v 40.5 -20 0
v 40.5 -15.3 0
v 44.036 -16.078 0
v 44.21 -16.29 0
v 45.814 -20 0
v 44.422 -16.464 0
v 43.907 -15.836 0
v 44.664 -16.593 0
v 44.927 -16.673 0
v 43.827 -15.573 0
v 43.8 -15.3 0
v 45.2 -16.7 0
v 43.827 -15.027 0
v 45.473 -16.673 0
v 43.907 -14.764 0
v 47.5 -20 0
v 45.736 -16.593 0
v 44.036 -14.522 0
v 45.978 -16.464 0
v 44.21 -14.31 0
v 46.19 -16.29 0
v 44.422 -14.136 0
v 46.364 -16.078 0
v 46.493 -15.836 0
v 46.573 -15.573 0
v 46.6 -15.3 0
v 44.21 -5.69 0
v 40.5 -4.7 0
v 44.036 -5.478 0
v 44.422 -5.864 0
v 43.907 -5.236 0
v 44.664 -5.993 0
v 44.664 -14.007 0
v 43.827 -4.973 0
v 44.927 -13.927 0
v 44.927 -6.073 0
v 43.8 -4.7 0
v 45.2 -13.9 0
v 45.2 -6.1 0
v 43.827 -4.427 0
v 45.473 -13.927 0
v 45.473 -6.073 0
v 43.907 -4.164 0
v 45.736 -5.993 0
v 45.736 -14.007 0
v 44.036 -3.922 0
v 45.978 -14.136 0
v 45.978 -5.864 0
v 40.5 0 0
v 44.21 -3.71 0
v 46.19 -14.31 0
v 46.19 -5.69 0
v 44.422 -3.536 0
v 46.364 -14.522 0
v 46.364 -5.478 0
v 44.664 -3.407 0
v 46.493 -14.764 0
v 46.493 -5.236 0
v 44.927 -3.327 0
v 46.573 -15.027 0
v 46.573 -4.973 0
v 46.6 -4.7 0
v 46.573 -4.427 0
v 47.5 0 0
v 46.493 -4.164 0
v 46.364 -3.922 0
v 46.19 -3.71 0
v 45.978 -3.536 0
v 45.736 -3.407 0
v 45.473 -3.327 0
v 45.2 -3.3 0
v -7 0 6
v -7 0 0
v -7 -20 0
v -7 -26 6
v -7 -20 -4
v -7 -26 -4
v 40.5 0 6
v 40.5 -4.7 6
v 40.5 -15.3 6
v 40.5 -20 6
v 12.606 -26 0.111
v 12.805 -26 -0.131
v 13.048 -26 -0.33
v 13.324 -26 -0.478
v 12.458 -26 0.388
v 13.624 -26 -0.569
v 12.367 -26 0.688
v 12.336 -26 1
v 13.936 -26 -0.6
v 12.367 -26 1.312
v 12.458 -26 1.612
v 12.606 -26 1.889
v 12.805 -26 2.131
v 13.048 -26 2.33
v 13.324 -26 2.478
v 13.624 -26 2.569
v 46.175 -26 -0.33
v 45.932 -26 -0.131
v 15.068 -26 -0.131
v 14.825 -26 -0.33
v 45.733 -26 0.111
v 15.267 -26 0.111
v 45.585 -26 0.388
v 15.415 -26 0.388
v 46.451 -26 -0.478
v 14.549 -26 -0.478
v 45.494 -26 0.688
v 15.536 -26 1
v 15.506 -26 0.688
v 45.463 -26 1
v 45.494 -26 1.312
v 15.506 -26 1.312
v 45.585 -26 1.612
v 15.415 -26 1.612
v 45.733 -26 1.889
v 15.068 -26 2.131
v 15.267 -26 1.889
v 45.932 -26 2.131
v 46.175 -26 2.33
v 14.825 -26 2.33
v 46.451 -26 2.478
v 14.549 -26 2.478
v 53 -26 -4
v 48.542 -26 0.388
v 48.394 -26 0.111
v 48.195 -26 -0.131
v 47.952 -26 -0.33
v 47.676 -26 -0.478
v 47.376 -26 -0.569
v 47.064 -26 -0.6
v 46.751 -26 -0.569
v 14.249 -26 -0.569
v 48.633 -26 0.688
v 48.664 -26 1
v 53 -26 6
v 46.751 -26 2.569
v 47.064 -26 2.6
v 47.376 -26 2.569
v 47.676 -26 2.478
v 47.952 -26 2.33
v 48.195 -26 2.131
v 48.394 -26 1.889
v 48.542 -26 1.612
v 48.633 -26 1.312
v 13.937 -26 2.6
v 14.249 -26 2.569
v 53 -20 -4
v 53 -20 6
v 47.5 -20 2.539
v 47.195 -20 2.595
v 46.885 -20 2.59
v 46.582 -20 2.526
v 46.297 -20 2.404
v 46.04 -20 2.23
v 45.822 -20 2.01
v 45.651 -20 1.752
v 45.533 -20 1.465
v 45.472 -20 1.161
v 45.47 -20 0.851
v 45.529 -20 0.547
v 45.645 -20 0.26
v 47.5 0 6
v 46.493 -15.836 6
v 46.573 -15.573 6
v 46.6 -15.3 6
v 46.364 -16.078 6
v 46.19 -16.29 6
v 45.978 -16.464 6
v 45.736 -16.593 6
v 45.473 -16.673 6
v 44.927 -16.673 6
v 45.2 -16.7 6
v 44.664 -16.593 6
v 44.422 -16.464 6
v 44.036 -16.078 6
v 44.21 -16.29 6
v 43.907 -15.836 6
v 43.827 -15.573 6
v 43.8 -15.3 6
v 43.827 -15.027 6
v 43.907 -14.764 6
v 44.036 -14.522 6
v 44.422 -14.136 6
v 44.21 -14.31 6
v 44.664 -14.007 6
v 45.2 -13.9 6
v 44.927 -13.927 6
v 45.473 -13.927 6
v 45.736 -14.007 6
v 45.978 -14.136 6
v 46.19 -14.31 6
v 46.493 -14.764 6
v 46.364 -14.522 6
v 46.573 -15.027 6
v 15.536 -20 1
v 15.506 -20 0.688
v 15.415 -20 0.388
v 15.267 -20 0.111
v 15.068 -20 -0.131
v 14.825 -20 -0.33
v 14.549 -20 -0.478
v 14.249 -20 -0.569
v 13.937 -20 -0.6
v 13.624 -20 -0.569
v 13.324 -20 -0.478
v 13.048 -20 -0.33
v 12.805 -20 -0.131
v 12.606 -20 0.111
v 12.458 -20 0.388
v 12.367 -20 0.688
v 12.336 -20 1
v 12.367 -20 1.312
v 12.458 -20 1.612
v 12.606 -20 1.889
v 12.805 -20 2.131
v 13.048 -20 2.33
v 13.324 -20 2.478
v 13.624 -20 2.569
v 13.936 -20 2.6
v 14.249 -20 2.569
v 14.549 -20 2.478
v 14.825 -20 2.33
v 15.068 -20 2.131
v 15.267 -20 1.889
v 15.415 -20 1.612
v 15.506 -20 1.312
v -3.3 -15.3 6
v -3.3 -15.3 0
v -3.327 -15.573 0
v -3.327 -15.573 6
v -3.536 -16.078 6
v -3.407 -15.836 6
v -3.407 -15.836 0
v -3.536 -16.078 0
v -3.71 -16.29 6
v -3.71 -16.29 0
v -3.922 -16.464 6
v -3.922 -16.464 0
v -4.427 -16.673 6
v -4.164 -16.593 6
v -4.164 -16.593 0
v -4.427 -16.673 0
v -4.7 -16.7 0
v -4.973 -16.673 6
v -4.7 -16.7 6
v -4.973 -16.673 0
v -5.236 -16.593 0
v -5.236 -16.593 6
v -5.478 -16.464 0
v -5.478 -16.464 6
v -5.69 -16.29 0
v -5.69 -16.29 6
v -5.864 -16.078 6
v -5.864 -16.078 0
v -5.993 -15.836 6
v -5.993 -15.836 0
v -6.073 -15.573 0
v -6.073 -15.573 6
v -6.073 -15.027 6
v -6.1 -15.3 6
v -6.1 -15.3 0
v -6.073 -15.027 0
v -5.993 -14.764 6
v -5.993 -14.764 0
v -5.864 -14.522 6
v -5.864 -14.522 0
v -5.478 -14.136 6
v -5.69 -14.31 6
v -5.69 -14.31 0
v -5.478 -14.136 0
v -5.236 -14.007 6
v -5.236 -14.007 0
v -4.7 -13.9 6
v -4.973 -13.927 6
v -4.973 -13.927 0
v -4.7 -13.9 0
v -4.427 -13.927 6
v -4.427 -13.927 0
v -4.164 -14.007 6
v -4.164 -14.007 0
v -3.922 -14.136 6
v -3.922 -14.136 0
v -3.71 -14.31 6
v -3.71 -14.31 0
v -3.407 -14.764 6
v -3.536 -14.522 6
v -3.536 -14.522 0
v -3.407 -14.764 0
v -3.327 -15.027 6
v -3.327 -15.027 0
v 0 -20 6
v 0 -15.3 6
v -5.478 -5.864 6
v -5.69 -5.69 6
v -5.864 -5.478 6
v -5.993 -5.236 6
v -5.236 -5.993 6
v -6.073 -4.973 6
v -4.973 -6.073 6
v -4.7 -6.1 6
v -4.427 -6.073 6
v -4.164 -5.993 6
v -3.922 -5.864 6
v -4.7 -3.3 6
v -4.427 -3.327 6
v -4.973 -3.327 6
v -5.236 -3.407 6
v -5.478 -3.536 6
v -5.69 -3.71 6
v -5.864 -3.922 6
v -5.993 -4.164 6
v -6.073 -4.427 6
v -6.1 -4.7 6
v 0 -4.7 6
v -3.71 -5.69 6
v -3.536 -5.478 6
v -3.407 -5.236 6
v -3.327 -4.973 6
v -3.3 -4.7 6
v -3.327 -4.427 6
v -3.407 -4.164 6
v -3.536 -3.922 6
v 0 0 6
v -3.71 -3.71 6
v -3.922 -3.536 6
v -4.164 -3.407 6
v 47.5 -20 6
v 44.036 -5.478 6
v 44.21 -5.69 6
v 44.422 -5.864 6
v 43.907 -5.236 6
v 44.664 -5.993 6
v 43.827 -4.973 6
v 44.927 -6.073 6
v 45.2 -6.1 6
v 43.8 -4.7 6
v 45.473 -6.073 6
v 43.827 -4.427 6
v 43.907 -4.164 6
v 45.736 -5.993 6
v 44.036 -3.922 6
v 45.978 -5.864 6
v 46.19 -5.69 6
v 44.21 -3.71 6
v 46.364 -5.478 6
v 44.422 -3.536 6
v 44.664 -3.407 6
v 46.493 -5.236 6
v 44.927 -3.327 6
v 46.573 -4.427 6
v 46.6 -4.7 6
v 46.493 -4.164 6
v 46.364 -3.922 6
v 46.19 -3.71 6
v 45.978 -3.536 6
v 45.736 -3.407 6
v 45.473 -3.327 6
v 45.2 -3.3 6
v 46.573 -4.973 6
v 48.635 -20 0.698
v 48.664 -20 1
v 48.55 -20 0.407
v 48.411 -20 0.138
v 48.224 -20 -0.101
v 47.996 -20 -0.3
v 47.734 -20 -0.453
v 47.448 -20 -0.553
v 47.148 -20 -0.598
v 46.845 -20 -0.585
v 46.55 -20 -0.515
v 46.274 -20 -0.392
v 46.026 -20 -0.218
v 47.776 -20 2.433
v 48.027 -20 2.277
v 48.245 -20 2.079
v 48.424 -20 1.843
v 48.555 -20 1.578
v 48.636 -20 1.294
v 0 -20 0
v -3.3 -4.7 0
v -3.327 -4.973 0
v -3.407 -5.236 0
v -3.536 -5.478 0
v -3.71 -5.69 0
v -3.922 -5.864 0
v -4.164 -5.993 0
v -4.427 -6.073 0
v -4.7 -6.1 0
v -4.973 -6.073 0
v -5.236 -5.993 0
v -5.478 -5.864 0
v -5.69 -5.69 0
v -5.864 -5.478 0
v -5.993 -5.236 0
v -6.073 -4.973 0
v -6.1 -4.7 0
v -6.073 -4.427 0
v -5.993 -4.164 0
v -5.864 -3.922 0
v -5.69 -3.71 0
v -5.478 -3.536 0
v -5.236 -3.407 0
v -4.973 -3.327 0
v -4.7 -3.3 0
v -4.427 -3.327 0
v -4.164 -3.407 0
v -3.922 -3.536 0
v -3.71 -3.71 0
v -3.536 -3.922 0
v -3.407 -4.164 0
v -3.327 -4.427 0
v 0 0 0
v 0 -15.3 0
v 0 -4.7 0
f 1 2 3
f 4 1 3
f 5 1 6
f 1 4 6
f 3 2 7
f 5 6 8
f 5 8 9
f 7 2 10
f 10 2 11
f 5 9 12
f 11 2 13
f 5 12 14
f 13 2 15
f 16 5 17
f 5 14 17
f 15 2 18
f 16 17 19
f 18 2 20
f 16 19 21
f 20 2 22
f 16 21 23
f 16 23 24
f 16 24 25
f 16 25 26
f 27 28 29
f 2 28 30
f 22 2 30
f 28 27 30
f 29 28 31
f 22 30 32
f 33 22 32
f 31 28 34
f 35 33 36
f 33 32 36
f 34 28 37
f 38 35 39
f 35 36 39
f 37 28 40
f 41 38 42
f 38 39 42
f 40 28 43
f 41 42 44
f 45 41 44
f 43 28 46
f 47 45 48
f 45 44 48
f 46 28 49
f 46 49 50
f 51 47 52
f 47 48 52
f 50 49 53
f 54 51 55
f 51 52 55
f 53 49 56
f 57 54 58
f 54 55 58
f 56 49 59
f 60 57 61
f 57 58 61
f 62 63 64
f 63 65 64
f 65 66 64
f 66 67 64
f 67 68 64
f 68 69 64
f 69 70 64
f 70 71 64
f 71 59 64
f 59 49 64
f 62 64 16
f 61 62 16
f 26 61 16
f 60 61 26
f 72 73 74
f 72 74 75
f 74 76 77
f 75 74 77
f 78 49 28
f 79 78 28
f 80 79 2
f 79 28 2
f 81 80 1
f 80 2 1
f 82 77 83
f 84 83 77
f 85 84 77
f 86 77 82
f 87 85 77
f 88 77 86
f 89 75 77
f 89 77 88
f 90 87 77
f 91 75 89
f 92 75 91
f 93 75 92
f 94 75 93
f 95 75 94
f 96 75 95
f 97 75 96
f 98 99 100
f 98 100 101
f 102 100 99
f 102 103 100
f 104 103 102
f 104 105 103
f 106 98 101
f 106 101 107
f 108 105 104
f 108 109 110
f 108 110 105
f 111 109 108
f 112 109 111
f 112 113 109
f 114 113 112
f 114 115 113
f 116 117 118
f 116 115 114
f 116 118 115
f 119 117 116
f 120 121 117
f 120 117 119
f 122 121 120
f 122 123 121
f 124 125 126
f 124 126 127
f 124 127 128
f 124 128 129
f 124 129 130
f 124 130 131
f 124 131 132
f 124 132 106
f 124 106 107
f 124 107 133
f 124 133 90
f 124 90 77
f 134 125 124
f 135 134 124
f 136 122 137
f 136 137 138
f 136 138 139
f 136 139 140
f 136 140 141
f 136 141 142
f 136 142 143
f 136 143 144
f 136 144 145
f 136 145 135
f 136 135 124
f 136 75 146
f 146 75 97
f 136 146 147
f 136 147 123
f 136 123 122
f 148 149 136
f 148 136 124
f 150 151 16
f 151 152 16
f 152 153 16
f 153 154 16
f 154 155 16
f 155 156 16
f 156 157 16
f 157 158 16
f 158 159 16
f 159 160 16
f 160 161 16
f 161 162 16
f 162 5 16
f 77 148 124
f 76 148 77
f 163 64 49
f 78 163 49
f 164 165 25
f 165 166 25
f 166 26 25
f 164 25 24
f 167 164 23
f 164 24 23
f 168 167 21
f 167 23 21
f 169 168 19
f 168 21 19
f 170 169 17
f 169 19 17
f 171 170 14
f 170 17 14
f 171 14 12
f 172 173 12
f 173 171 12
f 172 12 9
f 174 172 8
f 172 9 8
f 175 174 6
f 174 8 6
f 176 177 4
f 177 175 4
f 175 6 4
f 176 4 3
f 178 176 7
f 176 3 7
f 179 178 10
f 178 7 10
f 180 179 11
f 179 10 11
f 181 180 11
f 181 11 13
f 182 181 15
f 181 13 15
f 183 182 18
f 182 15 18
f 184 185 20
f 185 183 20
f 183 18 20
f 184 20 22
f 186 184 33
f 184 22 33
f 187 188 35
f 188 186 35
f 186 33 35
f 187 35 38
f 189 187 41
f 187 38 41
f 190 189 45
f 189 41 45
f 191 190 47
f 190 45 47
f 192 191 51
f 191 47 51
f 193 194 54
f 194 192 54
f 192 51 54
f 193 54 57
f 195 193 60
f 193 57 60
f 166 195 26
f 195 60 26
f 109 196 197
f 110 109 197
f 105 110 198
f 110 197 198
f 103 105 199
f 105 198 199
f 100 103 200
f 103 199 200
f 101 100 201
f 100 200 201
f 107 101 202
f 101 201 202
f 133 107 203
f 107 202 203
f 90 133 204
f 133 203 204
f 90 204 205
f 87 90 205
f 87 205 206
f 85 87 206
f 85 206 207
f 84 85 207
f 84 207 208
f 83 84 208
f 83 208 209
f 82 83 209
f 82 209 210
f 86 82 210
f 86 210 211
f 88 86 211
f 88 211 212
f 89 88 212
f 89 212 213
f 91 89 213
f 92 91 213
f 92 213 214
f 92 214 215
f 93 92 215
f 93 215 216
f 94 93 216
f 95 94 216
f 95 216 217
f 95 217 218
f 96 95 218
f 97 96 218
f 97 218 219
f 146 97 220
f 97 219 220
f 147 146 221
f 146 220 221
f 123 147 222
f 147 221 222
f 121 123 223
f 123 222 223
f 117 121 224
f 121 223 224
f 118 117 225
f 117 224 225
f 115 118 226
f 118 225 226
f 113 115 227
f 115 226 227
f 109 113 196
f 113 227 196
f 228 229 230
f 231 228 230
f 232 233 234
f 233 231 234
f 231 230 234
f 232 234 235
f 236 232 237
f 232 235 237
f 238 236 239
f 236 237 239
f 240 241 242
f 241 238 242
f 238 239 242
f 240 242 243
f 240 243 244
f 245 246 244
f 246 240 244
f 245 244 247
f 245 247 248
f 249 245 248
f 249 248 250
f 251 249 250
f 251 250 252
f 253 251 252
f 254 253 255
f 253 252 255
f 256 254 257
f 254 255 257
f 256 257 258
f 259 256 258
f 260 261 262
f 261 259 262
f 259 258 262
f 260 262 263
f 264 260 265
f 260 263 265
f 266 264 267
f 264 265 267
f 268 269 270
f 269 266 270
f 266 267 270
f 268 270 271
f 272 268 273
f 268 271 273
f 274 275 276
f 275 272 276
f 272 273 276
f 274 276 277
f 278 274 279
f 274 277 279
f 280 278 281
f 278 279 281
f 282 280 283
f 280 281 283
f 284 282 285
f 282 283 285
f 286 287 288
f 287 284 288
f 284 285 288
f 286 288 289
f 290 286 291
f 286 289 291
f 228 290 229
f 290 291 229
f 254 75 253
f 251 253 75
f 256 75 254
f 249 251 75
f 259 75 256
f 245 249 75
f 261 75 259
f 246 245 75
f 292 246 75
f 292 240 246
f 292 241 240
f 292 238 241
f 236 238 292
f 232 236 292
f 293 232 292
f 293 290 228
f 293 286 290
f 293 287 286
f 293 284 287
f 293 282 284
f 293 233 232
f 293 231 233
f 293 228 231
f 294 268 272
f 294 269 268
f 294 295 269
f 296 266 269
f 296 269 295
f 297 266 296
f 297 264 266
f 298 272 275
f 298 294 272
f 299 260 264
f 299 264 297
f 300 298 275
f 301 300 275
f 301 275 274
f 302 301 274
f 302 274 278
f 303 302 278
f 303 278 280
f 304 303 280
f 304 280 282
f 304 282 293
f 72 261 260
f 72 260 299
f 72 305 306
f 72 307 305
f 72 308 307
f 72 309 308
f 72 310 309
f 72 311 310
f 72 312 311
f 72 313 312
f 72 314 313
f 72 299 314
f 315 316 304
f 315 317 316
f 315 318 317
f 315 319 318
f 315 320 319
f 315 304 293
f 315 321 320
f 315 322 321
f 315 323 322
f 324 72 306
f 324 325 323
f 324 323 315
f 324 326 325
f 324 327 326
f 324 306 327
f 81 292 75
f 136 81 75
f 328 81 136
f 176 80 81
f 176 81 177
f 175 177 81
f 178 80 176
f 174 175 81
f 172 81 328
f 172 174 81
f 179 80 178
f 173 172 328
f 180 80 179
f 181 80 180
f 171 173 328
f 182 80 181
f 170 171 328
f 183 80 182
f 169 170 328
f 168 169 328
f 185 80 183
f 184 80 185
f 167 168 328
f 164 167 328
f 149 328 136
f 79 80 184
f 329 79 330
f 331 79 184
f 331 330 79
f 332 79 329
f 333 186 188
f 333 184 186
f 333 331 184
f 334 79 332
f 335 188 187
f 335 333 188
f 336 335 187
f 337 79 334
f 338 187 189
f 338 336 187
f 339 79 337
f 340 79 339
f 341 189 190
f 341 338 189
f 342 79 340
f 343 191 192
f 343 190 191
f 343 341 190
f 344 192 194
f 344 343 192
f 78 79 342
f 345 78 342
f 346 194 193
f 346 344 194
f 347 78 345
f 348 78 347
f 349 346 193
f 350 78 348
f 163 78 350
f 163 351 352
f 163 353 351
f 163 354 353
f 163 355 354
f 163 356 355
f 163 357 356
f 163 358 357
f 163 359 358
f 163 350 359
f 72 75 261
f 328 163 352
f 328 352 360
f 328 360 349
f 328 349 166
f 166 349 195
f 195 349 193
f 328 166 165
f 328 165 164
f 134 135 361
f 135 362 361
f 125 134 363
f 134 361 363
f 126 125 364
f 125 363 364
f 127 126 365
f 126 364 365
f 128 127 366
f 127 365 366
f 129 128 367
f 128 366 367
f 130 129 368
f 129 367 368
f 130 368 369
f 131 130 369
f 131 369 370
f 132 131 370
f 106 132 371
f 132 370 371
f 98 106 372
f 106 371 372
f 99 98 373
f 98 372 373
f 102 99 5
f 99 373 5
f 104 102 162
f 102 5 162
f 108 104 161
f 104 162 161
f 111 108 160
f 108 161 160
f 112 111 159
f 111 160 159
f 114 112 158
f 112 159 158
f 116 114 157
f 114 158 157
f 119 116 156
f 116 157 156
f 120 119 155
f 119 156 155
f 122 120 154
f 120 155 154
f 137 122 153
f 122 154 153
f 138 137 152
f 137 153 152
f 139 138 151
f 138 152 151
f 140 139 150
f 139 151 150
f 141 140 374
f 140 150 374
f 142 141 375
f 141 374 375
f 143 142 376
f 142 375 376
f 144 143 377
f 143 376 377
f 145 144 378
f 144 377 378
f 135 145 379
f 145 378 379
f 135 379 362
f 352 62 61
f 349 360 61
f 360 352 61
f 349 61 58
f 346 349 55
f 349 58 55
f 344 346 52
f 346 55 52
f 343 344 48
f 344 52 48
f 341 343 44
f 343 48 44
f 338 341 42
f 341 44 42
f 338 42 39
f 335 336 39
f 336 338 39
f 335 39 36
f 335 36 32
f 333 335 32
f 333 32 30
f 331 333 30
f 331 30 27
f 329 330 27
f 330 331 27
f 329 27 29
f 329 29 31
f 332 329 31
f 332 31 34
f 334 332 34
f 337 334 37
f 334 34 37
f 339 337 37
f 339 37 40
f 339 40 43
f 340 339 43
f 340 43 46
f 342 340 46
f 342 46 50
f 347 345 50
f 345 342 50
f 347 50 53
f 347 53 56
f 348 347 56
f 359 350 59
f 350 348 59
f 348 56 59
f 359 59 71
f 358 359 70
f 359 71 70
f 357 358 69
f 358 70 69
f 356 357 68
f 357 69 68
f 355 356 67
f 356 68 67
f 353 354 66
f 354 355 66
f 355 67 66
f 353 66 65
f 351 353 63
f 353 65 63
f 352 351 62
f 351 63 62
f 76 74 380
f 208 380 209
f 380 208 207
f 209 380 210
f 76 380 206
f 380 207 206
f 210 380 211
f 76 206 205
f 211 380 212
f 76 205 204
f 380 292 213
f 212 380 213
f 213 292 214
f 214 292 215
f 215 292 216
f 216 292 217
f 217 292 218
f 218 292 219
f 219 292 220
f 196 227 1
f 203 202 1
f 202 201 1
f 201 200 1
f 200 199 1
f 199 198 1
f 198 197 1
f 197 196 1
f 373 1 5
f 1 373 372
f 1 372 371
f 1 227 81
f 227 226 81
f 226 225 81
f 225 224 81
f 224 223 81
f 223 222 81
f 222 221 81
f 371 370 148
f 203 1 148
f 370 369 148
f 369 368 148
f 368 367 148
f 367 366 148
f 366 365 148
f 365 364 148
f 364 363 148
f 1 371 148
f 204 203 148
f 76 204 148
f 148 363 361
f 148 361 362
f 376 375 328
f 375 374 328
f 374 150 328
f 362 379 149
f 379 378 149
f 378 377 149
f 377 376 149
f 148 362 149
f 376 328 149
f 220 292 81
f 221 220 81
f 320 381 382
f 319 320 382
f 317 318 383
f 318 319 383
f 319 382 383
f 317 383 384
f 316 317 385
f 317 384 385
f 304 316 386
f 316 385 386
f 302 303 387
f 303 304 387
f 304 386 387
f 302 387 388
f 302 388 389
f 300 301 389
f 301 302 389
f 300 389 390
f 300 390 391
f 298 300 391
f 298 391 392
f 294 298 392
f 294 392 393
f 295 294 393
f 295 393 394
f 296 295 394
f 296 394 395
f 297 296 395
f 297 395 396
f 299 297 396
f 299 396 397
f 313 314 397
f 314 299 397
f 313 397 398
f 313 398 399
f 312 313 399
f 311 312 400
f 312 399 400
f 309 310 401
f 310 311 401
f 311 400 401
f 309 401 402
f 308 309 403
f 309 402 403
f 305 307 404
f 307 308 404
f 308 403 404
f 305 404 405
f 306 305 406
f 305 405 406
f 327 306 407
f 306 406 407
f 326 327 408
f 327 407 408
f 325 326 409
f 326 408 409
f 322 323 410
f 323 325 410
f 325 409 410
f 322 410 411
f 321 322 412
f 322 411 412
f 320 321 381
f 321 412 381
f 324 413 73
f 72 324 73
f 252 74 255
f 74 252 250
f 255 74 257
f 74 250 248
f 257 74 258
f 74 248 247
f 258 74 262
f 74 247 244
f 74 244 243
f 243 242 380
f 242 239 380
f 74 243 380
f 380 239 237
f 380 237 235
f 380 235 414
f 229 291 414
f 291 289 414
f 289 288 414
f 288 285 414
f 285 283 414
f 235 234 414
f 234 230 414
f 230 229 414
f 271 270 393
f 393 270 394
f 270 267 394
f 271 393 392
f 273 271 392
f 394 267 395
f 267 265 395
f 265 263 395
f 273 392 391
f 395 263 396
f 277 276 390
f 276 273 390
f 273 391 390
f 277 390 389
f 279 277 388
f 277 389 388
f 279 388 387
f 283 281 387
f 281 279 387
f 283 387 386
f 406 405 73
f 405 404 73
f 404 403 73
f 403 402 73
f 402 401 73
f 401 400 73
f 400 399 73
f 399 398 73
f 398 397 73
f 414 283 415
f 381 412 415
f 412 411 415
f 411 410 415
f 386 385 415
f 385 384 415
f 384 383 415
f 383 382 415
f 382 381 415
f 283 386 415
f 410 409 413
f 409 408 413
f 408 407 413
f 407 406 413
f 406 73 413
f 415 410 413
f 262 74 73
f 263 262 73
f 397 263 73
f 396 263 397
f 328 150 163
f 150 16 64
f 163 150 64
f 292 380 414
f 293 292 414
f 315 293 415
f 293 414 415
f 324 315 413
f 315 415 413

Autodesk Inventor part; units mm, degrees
ref_plane "YZ Plane" through (0, 0, 0) normal (1, 0, 0) x (0, 1, 0)
ref_plane "XZ Plane" through (0, 0, 0) normal (0, 1, 0) x (-1, 0, 0)
ref_plane "XY Plane" through (0, 0, 0) normal (0, 0, 1) x (1, 0, 0)
sketch "Эскиз2" plane through (0, 0, 0) normal (0, 0, 1) x (1, 0, 0)
  line L0 (0, 0) -> (40.5, 0)
  line L1 (40.5, 0) -> (40.5, -20)
  line L2 (40.5, -20) -> (0, -20)
  line L3 (0, -20) -> (0, 0)
  line L4 (40.5, 0) -> (40.5, -4.7)
  line L5 (40.5, -4.7) -> (45.2, -4.7)
  line L6 (45.2, -15.3) -> (40.5, -15.3)
  line L7 (40.5, -15.3) -> (40.5, -20)
  line L8 (0, -4.7) -> (-4.7, -4.7)
  line L9 (-4.7, -15.3) -> (0, -15.3)
  line L10 (0, 0) -> (-7, 0)
  line L11 (-7, 0) -> (-7, -20)
  line L12 (-7, -20) -> (40.5, -20)
  line L13 (40.5, -20) -> (47.5, -20)
  line L14 (47.5, -20) -> (47.5, 0)
  line L15 (47.5, 0) -> (40.5, 0)
  circle A0 centre (-4.7, -4.7) radius 1.4
  circle A1 centre (-4.7, -15.3) radius 1.4
  circle A2 centre (45.2, -4.7) radius 1.4
  circle A3 centre (45.2, -15.3) radius 1.4
  dimension "d9" = 40.5
  dimension "d11" = 4.7
  dimension "d12" = 4.7
  dimension "d14" = 4.7
  dimension "d15" = 7
  dimension "d16" = 7
  dimension "d17" = 2.8
  dimension "d18" = 2.8
  dimension "d19" = 2.8
  dimension "d20" = 2.8
extrude "Выдавливание2" add sketch "Эскиз2" along normal blind 6 contours L3 L12 L11 L10 | L15 L14 L13 L1
sketch "Эскиз3" plane through (-7, -20, 0) normal (0, -1, 0) x (1, 0, 0)
  line L0 (7, 6) -> (0, 6) projected
  line L1 (47.5, 0) -> (54.5, 0) projected
  line L2 (0, 6) -> (54.5, 6)
  line L3 (54.5, 6) -> (54.5, 0)
  line L4 (54.5, 0) -> (0, 0)
  line L5 (0, 0) -> (0, 6)
  line L6 (47.5, 0) -> (47.5, 6) projected
  line L7 (47.5, 6) -> (37.5, 6)
  line L8 (37.5, 6) -> (54.0635, 6)
  line L9 (54.0635, 6) -> (20.9365, 6)
  line L10 (20.9365, 6) -> (20.9365, 1)
  line L11 (20.9365, 1) -> (54.0635, 1)
  line L12 (54.0635, 1) -> (54.0635, 6)
  circle A0 centre (20.9365, 1) radius 1.6
  circle A1 centre (54.0635, 1) radius 1.6
  line L13 (0, 6) -> (60, 6)
  line L14 (60, 6) -> (60, -4)
  line L15 (60, -4) -> (0, -4)
  line L16 (0, -4) -> (0, 6)
  point P0 (7, 0)
  point P1 (0, 0)
  dimension "d23" = 10
  dimension "d24" = 16.5635
  dimension "d25" = 33.127
  dimension "d26" = 5
  dimension "d27" = 3.2
  dimension "d28" = 3.2
  dimension "d29" = 60
  dimension "d30" = 10
extrude "Выдавливание3" add sketch "Эскиз3" along normal blind 6 contours L2 L10 A0 L4 L5 L0 | L2 L6 L11 A0 L10 | L4 A0 L1 A1 L3 L13 L14 L15 L16 | L2 L12 A1 L11 L6 | L11 L6 L4 A0 | L2 L3 A1 L12 | L11 A1 L1 L6
properties part number "vydacha_3"
